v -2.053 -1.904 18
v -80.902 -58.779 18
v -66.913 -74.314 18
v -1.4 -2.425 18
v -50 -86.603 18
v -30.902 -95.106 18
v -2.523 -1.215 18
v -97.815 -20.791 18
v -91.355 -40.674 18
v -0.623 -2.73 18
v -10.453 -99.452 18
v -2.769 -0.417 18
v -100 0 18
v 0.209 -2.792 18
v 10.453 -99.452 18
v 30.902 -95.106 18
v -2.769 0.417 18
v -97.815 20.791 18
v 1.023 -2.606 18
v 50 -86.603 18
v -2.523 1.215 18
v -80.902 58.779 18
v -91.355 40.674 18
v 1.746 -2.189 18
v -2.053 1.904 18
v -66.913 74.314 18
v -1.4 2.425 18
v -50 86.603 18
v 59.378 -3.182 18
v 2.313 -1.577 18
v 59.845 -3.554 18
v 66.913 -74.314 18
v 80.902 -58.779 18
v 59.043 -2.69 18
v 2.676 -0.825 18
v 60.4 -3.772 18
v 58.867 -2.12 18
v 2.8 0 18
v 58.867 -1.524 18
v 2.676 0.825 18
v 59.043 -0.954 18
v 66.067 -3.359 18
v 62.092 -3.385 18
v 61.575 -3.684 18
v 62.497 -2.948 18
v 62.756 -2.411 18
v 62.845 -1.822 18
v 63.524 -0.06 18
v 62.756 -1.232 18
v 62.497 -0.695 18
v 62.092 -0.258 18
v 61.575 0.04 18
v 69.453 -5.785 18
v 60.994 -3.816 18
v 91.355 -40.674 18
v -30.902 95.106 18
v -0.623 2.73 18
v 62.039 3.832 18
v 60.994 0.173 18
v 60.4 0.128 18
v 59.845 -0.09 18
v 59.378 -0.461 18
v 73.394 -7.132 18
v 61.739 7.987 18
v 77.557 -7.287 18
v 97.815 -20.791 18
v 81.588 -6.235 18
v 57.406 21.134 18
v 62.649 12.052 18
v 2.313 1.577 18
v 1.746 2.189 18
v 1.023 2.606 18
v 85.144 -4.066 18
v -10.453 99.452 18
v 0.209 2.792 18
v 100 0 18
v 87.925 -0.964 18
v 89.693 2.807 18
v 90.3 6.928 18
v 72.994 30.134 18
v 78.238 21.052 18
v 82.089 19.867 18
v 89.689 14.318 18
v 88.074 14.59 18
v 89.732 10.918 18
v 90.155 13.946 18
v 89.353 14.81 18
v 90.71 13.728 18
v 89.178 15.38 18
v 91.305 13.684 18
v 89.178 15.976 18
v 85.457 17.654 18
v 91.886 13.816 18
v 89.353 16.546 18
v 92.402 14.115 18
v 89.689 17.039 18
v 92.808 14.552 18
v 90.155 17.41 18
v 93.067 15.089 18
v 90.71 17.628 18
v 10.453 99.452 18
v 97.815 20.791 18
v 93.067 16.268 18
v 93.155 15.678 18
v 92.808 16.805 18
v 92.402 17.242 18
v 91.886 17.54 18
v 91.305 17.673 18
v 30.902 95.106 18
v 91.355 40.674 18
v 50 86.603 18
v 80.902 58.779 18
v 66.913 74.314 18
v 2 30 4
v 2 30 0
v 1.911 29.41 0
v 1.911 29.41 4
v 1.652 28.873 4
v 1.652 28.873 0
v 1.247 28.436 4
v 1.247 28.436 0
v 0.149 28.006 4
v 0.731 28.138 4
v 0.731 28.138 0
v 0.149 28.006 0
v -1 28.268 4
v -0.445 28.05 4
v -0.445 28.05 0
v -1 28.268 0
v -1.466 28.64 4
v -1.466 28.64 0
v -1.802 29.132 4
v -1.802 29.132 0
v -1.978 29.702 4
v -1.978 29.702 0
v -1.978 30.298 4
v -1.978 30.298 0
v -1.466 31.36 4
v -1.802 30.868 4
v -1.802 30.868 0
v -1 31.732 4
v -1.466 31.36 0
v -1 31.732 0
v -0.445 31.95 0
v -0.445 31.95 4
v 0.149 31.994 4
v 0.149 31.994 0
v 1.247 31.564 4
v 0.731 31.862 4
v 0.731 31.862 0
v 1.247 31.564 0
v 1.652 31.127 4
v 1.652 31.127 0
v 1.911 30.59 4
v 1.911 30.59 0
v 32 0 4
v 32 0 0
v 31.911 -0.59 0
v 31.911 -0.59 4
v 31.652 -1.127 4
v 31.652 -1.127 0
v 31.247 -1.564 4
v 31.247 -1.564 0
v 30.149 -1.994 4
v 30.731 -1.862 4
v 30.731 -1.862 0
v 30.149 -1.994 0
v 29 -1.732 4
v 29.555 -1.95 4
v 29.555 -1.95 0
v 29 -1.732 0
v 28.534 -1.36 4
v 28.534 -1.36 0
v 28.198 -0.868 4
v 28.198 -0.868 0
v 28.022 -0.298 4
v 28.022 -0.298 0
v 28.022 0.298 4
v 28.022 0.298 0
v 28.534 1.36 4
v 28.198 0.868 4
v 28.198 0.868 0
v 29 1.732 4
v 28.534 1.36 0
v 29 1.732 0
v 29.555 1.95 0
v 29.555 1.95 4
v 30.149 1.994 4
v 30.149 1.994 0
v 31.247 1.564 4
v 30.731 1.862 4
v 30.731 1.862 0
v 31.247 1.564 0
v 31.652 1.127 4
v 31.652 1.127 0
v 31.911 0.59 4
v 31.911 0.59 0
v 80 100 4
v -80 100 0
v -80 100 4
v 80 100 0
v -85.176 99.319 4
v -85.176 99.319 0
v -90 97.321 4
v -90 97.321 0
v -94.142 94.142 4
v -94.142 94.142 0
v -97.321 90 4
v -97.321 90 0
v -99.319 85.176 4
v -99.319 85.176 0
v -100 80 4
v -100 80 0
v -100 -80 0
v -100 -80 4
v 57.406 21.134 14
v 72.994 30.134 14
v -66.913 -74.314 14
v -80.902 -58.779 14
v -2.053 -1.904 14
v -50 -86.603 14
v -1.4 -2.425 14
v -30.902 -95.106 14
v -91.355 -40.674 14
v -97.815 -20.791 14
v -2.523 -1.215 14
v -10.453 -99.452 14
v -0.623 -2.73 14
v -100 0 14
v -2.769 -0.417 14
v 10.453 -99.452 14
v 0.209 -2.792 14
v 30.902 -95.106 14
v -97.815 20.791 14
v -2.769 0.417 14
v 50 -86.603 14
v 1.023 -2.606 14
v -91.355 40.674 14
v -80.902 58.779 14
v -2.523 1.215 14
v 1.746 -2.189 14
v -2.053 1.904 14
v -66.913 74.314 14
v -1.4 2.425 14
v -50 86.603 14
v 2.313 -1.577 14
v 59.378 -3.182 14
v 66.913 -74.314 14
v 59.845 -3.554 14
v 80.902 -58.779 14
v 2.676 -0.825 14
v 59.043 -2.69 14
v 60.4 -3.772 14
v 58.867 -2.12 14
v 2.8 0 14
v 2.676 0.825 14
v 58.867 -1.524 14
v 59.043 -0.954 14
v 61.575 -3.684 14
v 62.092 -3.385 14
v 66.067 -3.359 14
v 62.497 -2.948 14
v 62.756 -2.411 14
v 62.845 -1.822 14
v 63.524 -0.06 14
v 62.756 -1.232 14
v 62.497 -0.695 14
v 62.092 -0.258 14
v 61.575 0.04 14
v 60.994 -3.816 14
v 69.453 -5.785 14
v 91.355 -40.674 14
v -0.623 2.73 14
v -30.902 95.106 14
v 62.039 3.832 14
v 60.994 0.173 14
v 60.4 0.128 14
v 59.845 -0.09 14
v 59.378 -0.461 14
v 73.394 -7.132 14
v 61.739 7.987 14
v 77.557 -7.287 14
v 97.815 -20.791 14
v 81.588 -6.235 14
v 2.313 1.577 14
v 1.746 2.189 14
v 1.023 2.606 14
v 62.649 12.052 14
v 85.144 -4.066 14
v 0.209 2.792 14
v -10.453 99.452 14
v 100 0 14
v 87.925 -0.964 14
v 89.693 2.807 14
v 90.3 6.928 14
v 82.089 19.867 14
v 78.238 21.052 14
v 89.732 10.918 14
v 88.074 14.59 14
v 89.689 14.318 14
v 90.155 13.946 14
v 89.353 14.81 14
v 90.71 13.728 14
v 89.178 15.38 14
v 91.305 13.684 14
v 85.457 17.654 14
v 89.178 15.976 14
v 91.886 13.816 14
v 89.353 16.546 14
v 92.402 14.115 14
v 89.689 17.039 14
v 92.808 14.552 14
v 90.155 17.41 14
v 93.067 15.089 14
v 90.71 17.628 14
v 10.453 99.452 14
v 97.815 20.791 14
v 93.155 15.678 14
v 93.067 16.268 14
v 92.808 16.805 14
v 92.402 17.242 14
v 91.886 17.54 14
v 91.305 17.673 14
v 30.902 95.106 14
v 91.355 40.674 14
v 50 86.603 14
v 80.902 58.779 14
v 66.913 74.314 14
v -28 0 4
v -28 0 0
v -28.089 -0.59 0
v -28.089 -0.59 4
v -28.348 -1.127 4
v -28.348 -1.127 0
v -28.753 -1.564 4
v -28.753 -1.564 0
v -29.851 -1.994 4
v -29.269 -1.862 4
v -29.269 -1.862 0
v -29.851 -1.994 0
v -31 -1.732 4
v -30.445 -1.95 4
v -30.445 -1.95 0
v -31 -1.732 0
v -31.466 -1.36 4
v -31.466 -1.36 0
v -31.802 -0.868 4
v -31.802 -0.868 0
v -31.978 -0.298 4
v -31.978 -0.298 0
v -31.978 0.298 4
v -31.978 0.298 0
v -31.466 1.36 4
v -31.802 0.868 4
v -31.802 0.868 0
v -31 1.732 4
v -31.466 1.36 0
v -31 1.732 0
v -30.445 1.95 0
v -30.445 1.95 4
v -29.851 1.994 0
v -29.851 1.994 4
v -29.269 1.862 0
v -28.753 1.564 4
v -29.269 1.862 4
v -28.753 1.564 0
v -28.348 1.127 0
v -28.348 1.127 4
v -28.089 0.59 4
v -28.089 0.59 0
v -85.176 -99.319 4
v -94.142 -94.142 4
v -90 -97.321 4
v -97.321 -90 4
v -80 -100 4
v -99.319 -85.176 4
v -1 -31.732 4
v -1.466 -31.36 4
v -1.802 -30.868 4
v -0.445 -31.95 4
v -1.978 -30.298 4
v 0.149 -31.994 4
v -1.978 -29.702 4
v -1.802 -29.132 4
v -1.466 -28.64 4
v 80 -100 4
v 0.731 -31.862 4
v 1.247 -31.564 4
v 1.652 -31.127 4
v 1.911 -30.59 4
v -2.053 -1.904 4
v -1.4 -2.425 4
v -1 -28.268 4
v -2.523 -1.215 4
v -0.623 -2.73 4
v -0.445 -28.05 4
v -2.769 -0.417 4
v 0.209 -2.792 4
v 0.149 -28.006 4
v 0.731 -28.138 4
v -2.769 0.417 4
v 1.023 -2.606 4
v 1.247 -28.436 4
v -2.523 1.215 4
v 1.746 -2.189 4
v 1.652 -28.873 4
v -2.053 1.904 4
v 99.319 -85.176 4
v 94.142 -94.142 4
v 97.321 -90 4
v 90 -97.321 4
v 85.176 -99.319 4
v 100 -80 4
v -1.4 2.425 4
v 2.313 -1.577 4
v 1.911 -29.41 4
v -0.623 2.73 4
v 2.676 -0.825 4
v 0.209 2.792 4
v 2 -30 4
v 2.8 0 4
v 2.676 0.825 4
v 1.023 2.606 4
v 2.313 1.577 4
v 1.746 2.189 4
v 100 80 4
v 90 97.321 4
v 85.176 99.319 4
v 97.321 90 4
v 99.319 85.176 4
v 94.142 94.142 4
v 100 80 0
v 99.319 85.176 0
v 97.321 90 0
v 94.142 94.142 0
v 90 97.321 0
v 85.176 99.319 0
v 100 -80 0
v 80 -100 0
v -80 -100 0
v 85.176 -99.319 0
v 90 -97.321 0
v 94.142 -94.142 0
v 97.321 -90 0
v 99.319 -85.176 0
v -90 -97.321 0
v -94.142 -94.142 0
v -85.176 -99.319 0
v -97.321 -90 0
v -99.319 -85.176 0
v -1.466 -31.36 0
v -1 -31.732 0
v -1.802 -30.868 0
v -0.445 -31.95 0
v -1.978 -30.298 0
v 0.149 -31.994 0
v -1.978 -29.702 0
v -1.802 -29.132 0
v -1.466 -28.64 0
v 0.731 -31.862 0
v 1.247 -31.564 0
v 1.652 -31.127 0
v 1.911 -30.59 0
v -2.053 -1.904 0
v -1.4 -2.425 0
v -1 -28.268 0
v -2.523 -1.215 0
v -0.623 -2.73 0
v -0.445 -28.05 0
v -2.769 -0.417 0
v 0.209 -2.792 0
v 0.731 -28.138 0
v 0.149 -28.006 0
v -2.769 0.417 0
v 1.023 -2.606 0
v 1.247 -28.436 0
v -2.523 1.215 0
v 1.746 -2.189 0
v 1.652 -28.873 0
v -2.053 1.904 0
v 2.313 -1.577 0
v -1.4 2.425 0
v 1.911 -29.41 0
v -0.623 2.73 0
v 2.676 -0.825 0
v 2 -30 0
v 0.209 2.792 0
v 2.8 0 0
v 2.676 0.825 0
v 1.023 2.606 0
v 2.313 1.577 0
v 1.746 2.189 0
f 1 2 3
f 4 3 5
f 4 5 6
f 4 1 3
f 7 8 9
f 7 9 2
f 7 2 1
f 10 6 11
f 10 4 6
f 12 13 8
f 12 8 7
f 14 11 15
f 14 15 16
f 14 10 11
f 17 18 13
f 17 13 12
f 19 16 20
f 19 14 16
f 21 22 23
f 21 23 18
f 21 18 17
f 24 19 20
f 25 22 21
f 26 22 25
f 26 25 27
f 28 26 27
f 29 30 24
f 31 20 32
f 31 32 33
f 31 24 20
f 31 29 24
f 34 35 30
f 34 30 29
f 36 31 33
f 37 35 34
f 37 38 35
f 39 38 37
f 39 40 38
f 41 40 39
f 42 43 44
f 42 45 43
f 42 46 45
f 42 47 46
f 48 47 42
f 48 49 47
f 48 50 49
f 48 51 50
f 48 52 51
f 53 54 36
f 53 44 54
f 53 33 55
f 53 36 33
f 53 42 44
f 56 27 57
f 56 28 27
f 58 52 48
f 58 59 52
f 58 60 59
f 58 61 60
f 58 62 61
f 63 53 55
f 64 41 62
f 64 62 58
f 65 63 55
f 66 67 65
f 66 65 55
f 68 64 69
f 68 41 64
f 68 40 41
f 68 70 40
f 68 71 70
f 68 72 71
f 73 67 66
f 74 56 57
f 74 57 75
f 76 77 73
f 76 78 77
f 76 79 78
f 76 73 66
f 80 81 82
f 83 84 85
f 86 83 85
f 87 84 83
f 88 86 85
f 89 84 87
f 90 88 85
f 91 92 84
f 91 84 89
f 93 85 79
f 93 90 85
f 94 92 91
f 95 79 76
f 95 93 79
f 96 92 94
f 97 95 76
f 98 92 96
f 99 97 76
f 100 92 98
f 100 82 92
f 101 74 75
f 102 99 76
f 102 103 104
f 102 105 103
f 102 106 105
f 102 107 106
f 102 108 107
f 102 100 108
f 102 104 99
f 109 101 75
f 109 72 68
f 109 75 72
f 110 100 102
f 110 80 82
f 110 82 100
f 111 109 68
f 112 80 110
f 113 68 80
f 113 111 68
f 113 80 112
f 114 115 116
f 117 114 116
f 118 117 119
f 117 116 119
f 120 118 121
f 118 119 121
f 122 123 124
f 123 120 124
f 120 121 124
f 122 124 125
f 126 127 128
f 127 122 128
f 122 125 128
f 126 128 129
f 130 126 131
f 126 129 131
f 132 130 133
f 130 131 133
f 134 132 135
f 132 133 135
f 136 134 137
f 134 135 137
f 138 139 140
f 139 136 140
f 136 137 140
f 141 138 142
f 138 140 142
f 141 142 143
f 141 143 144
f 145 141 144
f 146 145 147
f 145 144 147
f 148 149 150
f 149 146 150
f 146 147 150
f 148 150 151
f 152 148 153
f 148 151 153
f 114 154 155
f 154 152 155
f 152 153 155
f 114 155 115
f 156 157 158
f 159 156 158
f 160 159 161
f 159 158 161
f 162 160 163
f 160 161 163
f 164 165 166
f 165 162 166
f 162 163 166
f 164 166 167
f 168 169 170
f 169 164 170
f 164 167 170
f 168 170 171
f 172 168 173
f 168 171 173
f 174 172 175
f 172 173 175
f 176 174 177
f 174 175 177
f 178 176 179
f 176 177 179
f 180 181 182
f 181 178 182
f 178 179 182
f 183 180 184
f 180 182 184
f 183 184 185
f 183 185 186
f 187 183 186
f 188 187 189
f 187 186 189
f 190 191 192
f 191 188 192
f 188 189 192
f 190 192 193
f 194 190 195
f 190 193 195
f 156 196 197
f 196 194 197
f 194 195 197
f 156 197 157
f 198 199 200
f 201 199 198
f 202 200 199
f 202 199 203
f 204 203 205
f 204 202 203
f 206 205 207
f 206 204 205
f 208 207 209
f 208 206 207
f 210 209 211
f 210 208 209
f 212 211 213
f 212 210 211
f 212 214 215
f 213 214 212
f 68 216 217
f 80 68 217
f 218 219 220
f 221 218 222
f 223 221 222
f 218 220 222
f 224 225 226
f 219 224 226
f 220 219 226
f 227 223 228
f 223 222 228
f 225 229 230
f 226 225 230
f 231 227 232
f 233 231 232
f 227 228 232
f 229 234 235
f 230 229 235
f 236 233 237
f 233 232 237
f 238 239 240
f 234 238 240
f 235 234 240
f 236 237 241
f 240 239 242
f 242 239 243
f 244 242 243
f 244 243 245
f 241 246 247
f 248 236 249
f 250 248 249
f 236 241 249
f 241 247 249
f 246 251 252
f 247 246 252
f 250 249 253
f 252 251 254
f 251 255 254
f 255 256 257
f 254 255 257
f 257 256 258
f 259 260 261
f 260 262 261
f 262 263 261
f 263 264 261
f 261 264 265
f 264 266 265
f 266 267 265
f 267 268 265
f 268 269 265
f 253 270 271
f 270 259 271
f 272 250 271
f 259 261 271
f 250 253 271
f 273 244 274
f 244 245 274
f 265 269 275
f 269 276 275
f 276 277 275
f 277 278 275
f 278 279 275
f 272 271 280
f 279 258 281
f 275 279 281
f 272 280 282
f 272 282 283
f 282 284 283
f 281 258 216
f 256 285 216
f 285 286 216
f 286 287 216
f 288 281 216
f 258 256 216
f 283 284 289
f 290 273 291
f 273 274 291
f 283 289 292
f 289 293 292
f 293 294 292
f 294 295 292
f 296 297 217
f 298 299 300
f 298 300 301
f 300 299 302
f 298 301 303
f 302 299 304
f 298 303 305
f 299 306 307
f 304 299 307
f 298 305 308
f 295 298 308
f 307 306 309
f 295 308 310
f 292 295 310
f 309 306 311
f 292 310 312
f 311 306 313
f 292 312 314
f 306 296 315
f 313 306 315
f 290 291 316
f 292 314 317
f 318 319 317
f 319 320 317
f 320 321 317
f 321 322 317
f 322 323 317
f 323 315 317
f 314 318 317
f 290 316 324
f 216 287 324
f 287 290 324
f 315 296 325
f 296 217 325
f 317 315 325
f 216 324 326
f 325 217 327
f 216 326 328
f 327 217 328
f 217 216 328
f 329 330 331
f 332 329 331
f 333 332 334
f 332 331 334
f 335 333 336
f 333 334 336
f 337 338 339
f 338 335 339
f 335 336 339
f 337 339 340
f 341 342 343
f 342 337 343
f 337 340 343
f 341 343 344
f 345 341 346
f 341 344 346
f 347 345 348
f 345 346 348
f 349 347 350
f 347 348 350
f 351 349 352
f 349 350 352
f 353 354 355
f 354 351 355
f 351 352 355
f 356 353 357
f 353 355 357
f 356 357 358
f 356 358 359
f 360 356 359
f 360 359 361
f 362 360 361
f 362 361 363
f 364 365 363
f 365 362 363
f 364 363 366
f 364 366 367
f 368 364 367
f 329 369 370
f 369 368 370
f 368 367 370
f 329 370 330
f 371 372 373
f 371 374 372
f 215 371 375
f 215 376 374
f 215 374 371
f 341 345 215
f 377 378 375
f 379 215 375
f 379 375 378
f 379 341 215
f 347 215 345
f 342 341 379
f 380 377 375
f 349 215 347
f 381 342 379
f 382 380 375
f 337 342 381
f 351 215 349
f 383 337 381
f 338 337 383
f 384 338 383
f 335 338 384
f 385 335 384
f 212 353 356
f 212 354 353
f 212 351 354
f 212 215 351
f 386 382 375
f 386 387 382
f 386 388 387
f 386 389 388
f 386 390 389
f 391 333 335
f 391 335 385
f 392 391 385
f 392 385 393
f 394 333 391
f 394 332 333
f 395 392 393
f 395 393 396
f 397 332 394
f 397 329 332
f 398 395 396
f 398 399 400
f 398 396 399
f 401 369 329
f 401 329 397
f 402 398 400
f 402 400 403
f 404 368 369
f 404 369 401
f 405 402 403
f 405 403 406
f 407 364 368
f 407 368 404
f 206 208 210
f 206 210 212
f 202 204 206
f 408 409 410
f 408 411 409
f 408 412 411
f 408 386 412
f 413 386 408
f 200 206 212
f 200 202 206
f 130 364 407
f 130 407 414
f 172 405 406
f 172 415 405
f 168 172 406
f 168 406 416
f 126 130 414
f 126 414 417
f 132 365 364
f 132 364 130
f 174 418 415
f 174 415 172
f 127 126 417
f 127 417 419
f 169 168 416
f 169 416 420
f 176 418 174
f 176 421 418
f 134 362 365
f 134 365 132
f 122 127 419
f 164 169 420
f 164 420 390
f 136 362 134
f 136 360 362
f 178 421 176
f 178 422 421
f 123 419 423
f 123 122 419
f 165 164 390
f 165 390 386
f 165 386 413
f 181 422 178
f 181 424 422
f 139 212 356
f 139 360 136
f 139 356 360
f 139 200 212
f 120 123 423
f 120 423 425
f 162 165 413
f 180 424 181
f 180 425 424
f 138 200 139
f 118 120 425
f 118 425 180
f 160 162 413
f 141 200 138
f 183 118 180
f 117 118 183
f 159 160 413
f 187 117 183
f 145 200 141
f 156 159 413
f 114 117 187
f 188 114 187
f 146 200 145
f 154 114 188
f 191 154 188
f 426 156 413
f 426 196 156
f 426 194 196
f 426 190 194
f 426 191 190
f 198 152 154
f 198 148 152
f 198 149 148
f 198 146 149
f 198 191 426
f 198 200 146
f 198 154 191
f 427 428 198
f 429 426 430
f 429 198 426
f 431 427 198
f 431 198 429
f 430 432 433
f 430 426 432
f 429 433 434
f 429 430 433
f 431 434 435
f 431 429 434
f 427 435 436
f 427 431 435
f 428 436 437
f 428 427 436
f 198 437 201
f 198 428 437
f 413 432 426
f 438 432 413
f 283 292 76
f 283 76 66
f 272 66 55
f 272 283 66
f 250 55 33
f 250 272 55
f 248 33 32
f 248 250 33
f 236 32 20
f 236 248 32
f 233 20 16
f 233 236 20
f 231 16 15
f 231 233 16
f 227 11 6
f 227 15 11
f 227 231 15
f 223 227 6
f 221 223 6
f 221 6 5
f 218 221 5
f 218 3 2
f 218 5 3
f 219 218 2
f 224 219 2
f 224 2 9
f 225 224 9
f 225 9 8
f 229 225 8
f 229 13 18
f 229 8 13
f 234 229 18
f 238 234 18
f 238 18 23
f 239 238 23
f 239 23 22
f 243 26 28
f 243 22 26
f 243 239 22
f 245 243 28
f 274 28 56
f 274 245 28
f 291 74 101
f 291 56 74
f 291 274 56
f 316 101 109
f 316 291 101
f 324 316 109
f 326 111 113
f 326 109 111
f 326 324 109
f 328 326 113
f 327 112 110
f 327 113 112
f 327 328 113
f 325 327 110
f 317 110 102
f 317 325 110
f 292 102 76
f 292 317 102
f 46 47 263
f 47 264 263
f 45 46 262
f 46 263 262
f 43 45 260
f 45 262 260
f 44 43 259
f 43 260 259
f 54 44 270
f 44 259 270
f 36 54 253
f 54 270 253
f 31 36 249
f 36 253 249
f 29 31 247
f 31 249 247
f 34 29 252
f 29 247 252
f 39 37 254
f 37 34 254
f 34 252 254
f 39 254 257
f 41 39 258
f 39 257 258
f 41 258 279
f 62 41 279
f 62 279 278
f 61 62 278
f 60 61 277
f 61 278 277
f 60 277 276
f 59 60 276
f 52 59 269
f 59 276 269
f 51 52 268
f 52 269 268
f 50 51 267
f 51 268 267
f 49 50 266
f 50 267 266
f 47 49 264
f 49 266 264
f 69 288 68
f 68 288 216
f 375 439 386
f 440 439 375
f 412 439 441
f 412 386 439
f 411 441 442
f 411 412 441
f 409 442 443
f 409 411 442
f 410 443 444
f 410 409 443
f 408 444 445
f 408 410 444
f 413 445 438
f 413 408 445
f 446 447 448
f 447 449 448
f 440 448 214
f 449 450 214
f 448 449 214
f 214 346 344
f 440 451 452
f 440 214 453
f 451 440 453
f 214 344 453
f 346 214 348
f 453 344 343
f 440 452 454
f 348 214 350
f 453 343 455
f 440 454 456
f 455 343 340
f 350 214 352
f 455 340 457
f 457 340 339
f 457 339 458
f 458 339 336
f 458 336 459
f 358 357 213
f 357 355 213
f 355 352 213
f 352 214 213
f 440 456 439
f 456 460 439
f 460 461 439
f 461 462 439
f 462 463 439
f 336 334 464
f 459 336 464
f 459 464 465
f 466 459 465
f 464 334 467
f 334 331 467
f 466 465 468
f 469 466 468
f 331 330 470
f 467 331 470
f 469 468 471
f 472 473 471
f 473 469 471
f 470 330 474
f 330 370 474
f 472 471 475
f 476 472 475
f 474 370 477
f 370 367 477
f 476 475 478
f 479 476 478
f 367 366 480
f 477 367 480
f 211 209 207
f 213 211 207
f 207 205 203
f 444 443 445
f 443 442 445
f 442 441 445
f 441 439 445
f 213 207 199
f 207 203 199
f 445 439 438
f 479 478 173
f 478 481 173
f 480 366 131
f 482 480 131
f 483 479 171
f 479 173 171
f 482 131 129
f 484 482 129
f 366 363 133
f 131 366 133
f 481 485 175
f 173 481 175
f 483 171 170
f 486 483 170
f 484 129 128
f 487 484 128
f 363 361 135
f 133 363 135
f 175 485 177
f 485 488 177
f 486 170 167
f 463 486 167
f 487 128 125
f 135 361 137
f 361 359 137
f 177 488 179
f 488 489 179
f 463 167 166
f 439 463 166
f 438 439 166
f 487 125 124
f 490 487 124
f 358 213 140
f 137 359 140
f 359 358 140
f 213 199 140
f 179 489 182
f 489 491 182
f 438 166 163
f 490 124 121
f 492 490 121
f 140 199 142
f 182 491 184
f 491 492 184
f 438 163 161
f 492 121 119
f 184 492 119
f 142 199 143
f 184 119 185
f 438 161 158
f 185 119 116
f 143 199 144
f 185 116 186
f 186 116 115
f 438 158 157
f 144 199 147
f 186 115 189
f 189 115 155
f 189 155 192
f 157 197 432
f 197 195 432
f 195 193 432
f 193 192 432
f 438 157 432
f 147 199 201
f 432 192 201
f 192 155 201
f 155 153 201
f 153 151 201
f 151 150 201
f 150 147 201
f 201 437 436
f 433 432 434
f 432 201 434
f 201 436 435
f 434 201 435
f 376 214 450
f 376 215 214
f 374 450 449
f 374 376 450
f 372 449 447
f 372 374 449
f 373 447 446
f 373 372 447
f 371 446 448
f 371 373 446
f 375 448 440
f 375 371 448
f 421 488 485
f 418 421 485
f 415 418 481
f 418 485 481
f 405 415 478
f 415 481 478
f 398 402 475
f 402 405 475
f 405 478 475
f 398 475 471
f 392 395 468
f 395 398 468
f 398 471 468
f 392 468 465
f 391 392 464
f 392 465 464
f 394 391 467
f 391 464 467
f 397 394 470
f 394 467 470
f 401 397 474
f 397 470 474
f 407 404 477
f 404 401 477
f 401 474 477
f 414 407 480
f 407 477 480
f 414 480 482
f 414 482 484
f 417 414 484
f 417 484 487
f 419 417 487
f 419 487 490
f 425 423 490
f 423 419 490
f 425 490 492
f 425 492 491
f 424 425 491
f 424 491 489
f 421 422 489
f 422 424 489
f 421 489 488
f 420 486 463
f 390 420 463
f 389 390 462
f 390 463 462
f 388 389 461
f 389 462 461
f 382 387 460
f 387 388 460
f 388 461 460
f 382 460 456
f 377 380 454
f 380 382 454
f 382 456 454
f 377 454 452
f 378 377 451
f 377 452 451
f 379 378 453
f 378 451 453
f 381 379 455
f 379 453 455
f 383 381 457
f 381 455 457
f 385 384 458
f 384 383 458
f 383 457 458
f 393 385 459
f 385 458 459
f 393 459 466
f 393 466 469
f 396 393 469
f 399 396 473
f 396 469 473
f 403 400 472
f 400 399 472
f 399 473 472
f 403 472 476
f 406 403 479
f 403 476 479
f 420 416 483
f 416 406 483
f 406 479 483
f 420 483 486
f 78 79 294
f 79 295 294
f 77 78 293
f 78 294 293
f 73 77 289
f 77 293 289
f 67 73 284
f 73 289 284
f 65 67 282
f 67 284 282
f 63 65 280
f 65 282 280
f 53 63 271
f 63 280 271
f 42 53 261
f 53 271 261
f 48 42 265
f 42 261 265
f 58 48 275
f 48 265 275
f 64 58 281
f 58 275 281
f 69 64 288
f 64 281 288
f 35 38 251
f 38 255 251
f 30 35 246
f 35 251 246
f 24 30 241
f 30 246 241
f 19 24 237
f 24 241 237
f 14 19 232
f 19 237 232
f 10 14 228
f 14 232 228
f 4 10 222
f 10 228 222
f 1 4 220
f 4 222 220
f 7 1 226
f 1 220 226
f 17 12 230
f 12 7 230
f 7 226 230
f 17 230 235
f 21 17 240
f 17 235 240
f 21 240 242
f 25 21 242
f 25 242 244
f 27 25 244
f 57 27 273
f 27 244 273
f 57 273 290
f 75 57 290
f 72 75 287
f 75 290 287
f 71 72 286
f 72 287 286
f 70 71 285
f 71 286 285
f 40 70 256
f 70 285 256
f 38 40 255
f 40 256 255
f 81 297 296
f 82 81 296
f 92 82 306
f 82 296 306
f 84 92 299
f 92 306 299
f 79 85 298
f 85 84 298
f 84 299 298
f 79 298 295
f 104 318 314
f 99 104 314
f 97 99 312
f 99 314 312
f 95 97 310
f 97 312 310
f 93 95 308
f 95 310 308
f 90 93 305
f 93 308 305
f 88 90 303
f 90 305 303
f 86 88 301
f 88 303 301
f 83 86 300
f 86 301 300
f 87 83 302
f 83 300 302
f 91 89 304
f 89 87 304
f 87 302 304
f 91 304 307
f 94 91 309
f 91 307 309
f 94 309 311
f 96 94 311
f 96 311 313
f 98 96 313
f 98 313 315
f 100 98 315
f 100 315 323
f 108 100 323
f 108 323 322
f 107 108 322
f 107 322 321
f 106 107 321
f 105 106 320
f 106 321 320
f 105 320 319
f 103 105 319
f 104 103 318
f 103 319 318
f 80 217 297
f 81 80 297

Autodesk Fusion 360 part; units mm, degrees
sketch "Sketch1" plane through (0, 0, 0) normal (0, 0, 1) x (1, 0, 0)
  line L0 (-100, 100) -> (100, 100)
  line L1 (100, 100) -> (100, -100)
  line L2 (100, -100) -> (-100, -100)
  line L3 (-100, -100) -> (-100, 100)
  circle A0 centre (0, 0) radius 65 construction
  circle A1 centre (30, 0) radius 2
  circle A2 centre (0, 30) radius 2
  circle A3 centre (-30, 0) radius 2
  circle A4 centre (0, -30) radius 2
  circle A5 centre (0, 0) radius 2.8
  point P0 (0, -100)
  point P1 (-100, 0)
  dimension "d1" = 200
  dimension "d2" = 200
  dimension "d3" = 130
  dimension "d10" = 30
  dimension "d11" = 30
  dimension "d12" = 30
  dimension "d13" = 30
  dimension "d14" = 4
  dimension "d15" = 4
  dimension "d16" = 4
  dimension "d17" = 4
  dimension "d18" = 5.6
sketch "Sketch2" plane through (0, 0, 0) normal (0, 0, 1) x (1, 0, 0)
  circle A0 centre (0, 0) radius 100
  circle A1 centre (76, 6.9282) radius 14.3
  line L0 (60.8446, -1.8218) -> (91.1554, 15.6782) construction
  circle A2 centre (60.8446, -1.8218) radius 2
  circle A3 centre (91.1554, 15.6782) radius 2
  line L1 (76, 6.9282) -> (80, 0) construction
  line L2 (-49.7, 60.3) -> (49.7, 60.3) construction
  line L3 (49.7, 60.3) -> (49.7, -60.3) construction
  line L4 (49.7, -60.3) -> (-49.7, -60.3) construction
  line L5 (-49.7, -60.3) -> (-49.7, 60.3) construction
  line L6 (0, 0) -> (0, 9) construction
  line L7 (57.4058, 21.1344) -> (72.9942, 30.1344)
  line L8 (72.9942, 30.1344) -> (83.7942, 11.4282)
  line L9 (83.7942, 11.4282) -> (68.2058, 2.4282) construction
  line L10 (68.2058, 2.4282) -> (57.4058, 21.1344)
  circle A4 centre (0, 0) radius 2.8
  point P0 (80, 0)
  point P1 (76, 6.9282)
  point P2 (92.673, 16.9809)
  point P3 (98.1351, 19.2223)
  point P4 (0, 60.3)
  point P5 (-49.7, 0)
  point P6 (76, 6.9282)
  dimension "d19" = 200
  dimension "d20" = 80
  dimension "d21" = 28.6
  dimension "d22" = 8
  dimension "d23" = 35
  dimension "d24" = 4
  dimension "d25" = 4
  dimension "d27" = 99.4
  dimension "d28" = 120.6
  dimension "d29" = 60
  dimension "d30" = 18
  dimension "d31" = 21.6
  dimension "d32" = 5.6
extrude "Extrude1" add sketch "Sketch1" along normal blind 4 makes body 1
extrude "Extrude2" add sketch "Sketch2" along normal blind 4 from surface at 14 separate body makes body 2
fillet "Fillet1" radius 20 4 edges at (100, -100, 2) (-100, -100, 2) (-100, 100, 2) (100, 100, 2) on bodies 1
sketch "Sketch3" plane through (0, 0, 18) normal (0, 0, 1) x (-1, 0, 0)
  circle A0 centre (0, 0) radius 100
  circle A1 centre (-60.8446, 1.8218) radius 2
  circle A2 centre (-91.1554, -15.6782) radius 2
  arc A3 (-62.6495, -12.052) -> (-78.2379, -21.052) centre (-76, -6.9282) ccw
  line L0 (-62.6495, -12.052) -> (-57.4058, -21.1344)
  line L1 (-57.4058, -21.1344) -> (-72.9942, -30.1344)
  line L2 (-72.9942, -30.1344) -> (-78.2379, -21.052)
  circle A4 centre (0, 0) radius 2.8
sketch "Sketch4" plane through (0, 0, 4) normal (0, 0, 1) x (-1, 0, 0)
  arc A0 (-100, -80) -> (-80, -100) centre (-80, -80) ccw
  line L0 (-80, -100) -> (80, -100)
  arc A1 (80, -100) -> (100, -80) centre (80, -80) ccw
  line L1 (100, -80) -> (100, 80)
  arc A2 (100, 80) -> (80, 100) centre (80, 80) ccw
  line L2 (80, 100) -> (-80, 100)
  arc A3 (-80, 100) -> (-100, 80) centre (-80, 80) ccw
  line L3 (-100, 80) -> (-100, -80)
  circle A4 centre (30, 0) radius 2
  circle A5 centre (-30, 0) radius 2
  circle A6 centre (0, -30) radius 2
  circle A7 centre (0, 0) radius 2.8
  circle A8 centre (0, 30) radius 2
equation "ScrewDiameter = 4 mm"
equation "ScrewDistance = 30 mm"
equation "BigGearDiameter = 130 mm"
equation "SmallGearDiameter = 30 mm"
equation "ShaftDiameter = 5 mm"
equation "Clearance = 0.3 mm"
equation "d10 = ScrewDistance"
equation "d11 = ScrewDistance"
equation "d12 = ScrewDistance"
equation "d13 = ScrewDistance"
equation "d14 = ScrewDiameter"
equation "d15 = ScrewDiameter"
equation "d16 = ScrewDiameter"
equation "d17 = ScrewDiameter"
equation "d18 = ShaftDiameter + Clearance * 2"
equation "d21 = 28 mm + 2 * Clearance"
equation "d24 = ScrewDiameter"
equation "d25 = ScrewDiameter"
equation "d30 = 17.4 mm + 2 * Clearance"
equation "d31 = 17 mm + Clearance + 4.3 mm"
equation "d32 = ShaftDiameter + 2 * Clearance"
